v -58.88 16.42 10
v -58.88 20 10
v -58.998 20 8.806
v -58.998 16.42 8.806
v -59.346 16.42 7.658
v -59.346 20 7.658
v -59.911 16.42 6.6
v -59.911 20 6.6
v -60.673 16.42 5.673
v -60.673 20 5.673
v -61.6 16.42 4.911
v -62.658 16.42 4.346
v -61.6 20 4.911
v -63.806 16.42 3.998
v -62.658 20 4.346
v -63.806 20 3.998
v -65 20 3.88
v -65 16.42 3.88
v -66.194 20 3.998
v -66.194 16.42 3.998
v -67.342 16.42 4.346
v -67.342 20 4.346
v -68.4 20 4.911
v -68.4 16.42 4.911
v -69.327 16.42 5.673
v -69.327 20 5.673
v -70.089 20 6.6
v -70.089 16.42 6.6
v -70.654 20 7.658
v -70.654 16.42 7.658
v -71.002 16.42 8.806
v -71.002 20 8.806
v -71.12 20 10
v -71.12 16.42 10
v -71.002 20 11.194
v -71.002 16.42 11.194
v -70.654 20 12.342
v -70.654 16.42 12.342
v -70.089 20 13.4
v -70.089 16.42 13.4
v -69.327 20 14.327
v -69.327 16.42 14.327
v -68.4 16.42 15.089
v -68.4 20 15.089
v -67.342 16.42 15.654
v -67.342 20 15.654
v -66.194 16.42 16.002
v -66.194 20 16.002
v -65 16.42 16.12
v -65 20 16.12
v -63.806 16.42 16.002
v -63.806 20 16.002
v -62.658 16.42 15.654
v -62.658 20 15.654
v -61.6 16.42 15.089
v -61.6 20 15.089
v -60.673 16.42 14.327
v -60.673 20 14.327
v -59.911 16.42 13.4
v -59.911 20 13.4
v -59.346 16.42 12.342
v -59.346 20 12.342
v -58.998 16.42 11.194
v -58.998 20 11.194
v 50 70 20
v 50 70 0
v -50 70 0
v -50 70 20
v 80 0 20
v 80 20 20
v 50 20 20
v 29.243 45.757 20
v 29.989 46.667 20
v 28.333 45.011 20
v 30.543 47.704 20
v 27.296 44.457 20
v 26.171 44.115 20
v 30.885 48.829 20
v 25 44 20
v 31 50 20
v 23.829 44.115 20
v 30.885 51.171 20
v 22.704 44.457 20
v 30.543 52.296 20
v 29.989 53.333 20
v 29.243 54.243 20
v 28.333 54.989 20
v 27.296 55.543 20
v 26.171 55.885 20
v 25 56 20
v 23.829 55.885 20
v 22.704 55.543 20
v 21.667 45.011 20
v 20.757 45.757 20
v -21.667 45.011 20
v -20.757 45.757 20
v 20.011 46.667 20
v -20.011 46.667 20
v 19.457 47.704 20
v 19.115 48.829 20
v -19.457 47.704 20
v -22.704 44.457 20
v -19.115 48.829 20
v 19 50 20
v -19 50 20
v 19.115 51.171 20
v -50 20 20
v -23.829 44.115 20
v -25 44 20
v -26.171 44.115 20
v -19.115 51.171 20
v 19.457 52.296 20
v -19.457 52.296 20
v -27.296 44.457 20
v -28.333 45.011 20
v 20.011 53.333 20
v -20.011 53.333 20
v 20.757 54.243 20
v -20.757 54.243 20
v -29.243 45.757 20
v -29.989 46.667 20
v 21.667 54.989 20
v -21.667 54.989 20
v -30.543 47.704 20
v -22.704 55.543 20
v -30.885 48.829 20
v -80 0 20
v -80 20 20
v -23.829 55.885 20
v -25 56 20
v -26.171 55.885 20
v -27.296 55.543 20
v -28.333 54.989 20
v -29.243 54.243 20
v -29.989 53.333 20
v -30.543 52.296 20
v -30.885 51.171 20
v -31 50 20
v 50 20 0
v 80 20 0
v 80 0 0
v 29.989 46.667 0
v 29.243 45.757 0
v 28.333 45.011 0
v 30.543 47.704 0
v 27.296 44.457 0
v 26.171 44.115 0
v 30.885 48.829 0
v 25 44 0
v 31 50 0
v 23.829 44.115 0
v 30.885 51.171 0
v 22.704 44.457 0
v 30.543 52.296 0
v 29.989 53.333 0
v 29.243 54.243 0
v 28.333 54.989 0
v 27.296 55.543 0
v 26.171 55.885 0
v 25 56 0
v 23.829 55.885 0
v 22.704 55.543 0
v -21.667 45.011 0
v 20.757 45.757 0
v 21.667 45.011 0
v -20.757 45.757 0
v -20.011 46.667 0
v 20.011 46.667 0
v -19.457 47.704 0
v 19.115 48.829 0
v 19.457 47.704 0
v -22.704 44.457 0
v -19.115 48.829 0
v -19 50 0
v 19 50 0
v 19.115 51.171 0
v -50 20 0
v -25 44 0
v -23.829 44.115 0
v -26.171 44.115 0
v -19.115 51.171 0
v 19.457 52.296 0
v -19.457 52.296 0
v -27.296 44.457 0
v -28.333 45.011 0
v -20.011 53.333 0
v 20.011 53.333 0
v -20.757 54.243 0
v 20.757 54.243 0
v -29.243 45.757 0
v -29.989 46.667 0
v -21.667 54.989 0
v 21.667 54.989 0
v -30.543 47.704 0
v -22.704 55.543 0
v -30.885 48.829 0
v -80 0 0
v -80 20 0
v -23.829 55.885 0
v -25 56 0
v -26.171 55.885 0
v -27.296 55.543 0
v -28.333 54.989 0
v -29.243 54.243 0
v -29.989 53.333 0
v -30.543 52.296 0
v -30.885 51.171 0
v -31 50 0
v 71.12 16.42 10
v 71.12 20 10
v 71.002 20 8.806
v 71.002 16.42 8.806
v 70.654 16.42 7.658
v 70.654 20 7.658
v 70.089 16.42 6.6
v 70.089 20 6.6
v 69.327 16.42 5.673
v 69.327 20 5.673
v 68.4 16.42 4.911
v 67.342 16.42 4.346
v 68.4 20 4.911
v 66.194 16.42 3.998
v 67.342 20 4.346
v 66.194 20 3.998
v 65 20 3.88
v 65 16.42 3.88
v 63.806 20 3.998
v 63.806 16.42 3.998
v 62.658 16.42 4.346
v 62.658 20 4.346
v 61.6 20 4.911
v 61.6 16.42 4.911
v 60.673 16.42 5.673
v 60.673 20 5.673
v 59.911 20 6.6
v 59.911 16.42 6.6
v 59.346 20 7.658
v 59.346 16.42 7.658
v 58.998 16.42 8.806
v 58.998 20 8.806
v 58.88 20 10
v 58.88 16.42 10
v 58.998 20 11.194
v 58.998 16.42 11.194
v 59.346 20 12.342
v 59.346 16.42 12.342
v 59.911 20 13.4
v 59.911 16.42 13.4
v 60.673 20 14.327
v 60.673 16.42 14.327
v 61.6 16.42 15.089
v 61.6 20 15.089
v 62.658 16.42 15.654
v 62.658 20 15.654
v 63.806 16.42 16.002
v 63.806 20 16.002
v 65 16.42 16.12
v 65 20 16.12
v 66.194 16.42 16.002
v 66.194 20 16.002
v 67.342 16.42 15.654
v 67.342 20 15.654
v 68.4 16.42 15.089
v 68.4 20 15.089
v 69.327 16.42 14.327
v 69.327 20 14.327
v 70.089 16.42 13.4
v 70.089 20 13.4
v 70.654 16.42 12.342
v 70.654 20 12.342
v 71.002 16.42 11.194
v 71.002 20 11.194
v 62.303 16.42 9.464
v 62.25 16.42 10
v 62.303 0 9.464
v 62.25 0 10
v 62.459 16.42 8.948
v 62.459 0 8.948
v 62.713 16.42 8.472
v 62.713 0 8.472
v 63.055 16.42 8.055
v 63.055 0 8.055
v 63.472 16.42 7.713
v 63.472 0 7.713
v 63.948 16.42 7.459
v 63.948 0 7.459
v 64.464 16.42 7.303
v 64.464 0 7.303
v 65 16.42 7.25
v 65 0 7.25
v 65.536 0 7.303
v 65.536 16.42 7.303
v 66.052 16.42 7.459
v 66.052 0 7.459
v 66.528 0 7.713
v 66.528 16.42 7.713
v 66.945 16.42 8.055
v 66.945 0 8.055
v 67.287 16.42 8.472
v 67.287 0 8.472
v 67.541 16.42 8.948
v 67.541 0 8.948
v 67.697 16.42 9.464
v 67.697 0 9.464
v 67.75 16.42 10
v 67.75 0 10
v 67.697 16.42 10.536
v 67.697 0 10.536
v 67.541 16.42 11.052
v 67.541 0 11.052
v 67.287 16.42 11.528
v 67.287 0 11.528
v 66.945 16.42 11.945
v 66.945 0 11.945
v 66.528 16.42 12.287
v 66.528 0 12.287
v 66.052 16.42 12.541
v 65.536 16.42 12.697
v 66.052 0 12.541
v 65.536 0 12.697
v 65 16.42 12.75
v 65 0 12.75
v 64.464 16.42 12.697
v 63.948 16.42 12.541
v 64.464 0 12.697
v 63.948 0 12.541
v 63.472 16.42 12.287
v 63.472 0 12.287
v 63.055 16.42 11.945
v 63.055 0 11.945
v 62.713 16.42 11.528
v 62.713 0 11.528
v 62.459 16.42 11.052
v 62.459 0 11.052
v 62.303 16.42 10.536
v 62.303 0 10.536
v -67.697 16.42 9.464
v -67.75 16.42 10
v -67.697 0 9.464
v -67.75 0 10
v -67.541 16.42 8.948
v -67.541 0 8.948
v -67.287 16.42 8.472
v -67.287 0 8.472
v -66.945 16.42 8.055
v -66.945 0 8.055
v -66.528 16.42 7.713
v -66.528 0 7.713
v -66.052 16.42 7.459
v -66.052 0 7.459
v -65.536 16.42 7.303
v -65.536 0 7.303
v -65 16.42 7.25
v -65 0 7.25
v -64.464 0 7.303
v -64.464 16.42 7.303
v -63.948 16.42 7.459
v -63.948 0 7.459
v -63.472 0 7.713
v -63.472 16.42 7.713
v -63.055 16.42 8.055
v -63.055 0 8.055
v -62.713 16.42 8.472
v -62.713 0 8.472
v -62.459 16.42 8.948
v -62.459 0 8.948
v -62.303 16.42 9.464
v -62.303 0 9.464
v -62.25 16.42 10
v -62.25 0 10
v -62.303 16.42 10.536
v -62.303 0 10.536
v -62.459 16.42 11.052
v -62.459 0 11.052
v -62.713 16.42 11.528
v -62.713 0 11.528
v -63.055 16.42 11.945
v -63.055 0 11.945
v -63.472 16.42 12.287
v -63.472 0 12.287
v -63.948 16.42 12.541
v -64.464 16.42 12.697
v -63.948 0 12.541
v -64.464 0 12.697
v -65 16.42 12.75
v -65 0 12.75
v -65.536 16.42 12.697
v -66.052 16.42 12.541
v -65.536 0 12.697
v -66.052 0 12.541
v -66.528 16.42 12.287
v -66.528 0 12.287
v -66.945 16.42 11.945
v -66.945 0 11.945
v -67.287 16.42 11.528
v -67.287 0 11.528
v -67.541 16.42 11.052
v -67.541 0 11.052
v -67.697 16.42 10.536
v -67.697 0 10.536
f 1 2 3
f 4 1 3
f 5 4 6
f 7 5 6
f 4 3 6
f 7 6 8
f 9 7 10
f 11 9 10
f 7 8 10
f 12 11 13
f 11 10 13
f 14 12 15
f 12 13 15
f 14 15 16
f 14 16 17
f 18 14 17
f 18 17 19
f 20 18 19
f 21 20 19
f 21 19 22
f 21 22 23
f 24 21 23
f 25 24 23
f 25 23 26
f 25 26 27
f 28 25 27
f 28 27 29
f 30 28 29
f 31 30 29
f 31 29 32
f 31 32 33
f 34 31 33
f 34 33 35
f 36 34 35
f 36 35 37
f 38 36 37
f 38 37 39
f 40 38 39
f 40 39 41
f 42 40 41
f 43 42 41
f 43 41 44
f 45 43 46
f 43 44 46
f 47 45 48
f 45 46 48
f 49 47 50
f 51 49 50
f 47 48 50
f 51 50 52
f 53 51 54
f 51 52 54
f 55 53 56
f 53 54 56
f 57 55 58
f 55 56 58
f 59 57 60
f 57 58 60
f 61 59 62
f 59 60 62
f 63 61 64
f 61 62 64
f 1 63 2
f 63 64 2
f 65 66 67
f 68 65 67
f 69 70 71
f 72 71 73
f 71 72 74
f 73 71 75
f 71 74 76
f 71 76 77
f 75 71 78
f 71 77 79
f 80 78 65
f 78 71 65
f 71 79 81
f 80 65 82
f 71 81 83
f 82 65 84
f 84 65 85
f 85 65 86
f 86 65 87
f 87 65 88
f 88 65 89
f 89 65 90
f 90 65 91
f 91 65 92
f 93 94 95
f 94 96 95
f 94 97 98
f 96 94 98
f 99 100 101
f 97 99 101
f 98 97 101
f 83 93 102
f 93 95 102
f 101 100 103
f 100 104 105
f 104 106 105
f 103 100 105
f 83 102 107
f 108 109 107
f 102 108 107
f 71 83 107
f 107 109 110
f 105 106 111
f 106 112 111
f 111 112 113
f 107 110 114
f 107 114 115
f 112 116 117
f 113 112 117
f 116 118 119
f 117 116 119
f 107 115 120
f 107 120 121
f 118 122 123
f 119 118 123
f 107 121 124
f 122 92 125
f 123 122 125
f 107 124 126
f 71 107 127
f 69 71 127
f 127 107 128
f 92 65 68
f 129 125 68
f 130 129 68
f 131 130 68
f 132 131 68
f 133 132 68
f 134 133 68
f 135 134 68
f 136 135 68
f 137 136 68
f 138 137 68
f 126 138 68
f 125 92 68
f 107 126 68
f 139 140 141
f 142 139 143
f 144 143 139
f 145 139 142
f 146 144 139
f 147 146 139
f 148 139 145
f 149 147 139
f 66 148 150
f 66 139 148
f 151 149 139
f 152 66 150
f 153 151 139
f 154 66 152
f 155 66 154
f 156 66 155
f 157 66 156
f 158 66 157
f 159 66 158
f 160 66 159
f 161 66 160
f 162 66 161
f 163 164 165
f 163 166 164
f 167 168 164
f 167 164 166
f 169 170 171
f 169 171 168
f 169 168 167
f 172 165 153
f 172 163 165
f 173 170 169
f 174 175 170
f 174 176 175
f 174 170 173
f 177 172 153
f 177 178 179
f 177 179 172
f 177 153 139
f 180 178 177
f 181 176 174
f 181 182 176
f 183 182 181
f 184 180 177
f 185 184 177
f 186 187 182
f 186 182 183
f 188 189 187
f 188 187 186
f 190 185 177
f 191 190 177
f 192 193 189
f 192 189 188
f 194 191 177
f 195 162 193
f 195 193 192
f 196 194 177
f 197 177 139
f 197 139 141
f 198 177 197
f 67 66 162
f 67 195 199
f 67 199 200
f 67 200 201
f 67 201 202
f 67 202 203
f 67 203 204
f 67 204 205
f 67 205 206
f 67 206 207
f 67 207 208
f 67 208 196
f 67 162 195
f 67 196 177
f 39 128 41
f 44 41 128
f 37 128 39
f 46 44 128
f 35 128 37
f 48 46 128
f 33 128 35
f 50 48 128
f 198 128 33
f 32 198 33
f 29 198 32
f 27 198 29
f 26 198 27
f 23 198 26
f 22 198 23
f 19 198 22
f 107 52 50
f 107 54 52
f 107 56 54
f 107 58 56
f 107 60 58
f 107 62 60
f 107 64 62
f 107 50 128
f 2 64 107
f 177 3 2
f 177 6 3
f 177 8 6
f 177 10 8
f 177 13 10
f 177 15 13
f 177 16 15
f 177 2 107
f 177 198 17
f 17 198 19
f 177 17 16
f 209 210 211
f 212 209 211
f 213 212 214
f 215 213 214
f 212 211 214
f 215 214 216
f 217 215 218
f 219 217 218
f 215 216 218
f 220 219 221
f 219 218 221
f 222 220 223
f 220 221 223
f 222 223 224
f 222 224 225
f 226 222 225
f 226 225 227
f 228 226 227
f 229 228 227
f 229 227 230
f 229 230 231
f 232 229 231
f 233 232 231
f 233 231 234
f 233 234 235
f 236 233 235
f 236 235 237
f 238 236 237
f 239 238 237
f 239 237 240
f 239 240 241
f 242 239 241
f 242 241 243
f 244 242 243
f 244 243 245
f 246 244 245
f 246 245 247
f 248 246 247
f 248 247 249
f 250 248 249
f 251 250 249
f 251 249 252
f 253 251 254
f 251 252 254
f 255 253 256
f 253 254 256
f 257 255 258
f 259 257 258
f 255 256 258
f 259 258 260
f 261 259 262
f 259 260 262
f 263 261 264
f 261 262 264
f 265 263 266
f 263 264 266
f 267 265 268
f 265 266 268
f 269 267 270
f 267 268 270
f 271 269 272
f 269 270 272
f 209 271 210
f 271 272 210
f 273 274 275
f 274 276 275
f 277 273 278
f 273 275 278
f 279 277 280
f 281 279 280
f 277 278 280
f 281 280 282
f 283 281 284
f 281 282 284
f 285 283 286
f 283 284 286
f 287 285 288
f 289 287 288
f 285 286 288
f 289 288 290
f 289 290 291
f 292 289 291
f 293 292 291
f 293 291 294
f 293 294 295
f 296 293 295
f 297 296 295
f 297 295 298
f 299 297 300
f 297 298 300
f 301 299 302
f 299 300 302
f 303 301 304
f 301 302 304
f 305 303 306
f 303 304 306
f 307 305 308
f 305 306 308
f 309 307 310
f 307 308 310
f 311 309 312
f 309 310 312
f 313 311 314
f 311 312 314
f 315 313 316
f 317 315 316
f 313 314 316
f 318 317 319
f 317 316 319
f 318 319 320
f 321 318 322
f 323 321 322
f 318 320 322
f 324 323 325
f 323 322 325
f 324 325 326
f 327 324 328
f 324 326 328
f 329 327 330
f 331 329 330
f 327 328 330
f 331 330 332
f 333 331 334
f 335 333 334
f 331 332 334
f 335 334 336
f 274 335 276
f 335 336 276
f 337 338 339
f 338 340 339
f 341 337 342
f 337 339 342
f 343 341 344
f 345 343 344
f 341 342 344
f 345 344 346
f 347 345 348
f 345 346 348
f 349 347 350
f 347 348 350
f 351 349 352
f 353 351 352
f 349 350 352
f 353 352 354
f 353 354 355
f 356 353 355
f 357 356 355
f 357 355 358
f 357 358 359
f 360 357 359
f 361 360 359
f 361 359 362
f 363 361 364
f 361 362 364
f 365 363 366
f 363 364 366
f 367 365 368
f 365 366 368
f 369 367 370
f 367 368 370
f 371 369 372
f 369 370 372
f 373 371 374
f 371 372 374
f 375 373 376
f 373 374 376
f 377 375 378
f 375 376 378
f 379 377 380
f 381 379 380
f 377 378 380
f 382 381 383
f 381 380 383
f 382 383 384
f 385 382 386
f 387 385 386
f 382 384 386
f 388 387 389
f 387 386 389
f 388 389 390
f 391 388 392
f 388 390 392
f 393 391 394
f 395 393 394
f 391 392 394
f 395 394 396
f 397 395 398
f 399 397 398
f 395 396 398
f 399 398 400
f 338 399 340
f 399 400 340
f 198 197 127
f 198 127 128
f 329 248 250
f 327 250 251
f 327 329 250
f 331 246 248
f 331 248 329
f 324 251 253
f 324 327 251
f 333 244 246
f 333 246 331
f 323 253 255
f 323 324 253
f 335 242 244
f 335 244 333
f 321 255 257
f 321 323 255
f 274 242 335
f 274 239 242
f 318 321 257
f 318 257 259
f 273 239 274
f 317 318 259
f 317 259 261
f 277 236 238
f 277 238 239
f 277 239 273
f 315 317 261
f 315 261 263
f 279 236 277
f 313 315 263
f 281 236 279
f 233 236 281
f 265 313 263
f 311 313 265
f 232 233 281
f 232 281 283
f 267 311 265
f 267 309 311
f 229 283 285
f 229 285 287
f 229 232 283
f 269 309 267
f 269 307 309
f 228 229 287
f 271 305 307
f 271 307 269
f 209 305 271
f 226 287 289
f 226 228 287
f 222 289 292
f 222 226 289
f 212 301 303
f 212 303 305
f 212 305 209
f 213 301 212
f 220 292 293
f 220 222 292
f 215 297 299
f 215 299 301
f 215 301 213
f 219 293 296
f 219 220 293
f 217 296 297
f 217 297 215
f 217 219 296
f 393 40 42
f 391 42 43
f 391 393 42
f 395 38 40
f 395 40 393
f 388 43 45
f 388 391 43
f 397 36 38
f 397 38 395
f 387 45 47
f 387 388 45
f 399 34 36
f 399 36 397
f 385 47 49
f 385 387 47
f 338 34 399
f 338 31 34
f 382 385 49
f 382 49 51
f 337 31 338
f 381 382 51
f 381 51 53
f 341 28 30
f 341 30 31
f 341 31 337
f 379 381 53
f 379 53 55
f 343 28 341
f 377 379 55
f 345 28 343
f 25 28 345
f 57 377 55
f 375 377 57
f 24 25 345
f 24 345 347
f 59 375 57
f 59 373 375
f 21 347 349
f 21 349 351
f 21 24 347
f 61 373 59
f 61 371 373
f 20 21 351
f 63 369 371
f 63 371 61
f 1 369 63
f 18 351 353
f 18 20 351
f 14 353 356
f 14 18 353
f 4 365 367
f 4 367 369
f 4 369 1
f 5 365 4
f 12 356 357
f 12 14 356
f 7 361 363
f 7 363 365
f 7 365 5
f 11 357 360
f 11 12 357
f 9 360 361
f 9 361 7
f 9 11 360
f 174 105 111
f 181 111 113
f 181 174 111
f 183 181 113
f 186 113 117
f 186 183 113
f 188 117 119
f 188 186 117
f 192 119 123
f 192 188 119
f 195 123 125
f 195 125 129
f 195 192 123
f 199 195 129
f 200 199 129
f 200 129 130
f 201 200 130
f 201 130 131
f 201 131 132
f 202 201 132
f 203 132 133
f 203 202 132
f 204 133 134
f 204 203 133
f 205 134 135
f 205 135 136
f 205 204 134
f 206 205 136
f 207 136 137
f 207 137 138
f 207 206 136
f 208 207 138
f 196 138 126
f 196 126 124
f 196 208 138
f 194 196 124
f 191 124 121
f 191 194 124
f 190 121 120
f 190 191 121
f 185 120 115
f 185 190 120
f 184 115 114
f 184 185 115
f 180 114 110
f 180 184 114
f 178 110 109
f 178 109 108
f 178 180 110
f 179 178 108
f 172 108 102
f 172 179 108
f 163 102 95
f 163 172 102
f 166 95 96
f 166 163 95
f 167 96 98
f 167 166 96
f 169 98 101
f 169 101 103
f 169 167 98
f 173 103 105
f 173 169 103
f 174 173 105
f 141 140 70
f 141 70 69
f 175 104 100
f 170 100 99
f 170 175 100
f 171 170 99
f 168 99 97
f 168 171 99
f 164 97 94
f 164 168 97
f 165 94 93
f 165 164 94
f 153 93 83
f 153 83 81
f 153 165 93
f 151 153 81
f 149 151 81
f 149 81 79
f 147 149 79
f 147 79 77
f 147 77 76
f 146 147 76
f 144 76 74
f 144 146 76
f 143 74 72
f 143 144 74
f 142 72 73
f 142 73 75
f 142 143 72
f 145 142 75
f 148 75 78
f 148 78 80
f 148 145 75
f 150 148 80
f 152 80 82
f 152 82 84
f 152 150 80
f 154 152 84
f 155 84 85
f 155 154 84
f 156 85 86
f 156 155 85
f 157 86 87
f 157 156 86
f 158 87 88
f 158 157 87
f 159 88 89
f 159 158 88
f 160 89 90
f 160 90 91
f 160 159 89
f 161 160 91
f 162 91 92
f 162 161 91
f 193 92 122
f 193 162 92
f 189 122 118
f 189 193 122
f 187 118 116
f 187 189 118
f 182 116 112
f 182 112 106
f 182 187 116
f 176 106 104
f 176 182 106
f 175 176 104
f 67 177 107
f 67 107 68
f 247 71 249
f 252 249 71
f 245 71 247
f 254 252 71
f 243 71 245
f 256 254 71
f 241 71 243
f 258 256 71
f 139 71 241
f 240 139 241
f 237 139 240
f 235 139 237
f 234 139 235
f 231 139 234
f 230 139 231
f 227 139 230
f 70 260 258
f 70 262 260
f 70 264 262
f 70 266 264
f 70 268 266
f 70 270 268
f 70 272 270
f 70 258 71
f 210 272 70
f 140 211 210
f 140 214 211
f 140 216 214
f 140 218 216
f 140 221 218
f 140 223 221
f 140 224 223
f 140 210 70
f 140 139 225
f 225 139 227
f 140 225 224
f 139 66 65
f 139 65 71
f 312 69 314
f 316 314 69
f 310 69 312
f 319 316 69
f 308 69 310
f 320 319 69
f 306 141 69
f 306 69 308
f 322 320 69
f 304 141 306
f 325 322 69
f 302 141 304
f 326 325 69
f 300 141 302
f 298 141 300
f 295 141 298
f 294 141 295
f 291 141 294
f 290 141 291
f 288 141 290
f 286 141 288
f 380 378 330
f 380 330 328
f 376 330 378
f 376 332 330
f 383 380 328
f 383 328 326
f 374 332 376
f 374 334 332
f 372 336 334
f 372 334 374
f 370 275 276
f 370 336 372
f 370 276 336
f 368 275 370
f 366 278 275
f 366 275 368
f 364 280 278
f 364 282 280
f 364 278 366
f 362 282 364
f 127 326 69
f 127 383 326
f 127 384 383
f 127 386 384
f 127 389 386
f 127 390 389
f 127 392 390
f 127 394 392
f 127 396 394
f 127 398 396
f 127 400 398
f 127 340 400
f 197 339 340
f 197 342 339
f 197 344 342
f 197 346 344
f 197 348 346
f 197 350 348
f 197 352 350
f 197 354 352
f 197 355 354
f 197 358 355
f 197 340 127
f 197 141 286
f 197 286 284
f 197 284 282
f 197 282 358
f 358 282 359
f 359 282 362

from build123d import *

# Parameters (mm, degrees)
SKETCH2_R              = 6
CORPO_FUROS_12MM_DEPTH = 20
FUROS_6MM_D            = 5.5
FUROS_6MM_CBORE_D      = 12.24
FUROS_6MM_CBORE_DEPTH  = 3.58


with BuildPart() as part:
    # Sketch2 → Corpo - Furos 12mm (new body)
    with BuildSketch(Plane.XY):
        Polygon((80, 0), (-80, 0), (-80, 20), (-50, 20), (-50, 70), (0, 70), (50, 70), (50, 20), (80, 20), align=None)
        with Locations((-25, 50)):
            Circle(SKETCH2_R, mode=Mode.SUBTRACT)
        with Locations(Location((25, 50, 0), (0, 0, 180))):
            Circle(SKETCH2_R, mode=Mode.SUBTRACT)
    extrude(amount=CORPO_FUROS_12MM_DEPTH)

    # Furos Ø6mm (through all)
    with Locations(Plane(origin=(0, 20, 0), x_dir=(1, 0, 0), z_dir=(0, 1, 0))):
        with Locations((-65, -10), (65, -10)):
            CounterBoreHole(FUROS_6MM_D / 2, FUROS_6MM_CBORE_D / 2, FUROS_6MM_CBORE_DEPTH)


solid = part.part
